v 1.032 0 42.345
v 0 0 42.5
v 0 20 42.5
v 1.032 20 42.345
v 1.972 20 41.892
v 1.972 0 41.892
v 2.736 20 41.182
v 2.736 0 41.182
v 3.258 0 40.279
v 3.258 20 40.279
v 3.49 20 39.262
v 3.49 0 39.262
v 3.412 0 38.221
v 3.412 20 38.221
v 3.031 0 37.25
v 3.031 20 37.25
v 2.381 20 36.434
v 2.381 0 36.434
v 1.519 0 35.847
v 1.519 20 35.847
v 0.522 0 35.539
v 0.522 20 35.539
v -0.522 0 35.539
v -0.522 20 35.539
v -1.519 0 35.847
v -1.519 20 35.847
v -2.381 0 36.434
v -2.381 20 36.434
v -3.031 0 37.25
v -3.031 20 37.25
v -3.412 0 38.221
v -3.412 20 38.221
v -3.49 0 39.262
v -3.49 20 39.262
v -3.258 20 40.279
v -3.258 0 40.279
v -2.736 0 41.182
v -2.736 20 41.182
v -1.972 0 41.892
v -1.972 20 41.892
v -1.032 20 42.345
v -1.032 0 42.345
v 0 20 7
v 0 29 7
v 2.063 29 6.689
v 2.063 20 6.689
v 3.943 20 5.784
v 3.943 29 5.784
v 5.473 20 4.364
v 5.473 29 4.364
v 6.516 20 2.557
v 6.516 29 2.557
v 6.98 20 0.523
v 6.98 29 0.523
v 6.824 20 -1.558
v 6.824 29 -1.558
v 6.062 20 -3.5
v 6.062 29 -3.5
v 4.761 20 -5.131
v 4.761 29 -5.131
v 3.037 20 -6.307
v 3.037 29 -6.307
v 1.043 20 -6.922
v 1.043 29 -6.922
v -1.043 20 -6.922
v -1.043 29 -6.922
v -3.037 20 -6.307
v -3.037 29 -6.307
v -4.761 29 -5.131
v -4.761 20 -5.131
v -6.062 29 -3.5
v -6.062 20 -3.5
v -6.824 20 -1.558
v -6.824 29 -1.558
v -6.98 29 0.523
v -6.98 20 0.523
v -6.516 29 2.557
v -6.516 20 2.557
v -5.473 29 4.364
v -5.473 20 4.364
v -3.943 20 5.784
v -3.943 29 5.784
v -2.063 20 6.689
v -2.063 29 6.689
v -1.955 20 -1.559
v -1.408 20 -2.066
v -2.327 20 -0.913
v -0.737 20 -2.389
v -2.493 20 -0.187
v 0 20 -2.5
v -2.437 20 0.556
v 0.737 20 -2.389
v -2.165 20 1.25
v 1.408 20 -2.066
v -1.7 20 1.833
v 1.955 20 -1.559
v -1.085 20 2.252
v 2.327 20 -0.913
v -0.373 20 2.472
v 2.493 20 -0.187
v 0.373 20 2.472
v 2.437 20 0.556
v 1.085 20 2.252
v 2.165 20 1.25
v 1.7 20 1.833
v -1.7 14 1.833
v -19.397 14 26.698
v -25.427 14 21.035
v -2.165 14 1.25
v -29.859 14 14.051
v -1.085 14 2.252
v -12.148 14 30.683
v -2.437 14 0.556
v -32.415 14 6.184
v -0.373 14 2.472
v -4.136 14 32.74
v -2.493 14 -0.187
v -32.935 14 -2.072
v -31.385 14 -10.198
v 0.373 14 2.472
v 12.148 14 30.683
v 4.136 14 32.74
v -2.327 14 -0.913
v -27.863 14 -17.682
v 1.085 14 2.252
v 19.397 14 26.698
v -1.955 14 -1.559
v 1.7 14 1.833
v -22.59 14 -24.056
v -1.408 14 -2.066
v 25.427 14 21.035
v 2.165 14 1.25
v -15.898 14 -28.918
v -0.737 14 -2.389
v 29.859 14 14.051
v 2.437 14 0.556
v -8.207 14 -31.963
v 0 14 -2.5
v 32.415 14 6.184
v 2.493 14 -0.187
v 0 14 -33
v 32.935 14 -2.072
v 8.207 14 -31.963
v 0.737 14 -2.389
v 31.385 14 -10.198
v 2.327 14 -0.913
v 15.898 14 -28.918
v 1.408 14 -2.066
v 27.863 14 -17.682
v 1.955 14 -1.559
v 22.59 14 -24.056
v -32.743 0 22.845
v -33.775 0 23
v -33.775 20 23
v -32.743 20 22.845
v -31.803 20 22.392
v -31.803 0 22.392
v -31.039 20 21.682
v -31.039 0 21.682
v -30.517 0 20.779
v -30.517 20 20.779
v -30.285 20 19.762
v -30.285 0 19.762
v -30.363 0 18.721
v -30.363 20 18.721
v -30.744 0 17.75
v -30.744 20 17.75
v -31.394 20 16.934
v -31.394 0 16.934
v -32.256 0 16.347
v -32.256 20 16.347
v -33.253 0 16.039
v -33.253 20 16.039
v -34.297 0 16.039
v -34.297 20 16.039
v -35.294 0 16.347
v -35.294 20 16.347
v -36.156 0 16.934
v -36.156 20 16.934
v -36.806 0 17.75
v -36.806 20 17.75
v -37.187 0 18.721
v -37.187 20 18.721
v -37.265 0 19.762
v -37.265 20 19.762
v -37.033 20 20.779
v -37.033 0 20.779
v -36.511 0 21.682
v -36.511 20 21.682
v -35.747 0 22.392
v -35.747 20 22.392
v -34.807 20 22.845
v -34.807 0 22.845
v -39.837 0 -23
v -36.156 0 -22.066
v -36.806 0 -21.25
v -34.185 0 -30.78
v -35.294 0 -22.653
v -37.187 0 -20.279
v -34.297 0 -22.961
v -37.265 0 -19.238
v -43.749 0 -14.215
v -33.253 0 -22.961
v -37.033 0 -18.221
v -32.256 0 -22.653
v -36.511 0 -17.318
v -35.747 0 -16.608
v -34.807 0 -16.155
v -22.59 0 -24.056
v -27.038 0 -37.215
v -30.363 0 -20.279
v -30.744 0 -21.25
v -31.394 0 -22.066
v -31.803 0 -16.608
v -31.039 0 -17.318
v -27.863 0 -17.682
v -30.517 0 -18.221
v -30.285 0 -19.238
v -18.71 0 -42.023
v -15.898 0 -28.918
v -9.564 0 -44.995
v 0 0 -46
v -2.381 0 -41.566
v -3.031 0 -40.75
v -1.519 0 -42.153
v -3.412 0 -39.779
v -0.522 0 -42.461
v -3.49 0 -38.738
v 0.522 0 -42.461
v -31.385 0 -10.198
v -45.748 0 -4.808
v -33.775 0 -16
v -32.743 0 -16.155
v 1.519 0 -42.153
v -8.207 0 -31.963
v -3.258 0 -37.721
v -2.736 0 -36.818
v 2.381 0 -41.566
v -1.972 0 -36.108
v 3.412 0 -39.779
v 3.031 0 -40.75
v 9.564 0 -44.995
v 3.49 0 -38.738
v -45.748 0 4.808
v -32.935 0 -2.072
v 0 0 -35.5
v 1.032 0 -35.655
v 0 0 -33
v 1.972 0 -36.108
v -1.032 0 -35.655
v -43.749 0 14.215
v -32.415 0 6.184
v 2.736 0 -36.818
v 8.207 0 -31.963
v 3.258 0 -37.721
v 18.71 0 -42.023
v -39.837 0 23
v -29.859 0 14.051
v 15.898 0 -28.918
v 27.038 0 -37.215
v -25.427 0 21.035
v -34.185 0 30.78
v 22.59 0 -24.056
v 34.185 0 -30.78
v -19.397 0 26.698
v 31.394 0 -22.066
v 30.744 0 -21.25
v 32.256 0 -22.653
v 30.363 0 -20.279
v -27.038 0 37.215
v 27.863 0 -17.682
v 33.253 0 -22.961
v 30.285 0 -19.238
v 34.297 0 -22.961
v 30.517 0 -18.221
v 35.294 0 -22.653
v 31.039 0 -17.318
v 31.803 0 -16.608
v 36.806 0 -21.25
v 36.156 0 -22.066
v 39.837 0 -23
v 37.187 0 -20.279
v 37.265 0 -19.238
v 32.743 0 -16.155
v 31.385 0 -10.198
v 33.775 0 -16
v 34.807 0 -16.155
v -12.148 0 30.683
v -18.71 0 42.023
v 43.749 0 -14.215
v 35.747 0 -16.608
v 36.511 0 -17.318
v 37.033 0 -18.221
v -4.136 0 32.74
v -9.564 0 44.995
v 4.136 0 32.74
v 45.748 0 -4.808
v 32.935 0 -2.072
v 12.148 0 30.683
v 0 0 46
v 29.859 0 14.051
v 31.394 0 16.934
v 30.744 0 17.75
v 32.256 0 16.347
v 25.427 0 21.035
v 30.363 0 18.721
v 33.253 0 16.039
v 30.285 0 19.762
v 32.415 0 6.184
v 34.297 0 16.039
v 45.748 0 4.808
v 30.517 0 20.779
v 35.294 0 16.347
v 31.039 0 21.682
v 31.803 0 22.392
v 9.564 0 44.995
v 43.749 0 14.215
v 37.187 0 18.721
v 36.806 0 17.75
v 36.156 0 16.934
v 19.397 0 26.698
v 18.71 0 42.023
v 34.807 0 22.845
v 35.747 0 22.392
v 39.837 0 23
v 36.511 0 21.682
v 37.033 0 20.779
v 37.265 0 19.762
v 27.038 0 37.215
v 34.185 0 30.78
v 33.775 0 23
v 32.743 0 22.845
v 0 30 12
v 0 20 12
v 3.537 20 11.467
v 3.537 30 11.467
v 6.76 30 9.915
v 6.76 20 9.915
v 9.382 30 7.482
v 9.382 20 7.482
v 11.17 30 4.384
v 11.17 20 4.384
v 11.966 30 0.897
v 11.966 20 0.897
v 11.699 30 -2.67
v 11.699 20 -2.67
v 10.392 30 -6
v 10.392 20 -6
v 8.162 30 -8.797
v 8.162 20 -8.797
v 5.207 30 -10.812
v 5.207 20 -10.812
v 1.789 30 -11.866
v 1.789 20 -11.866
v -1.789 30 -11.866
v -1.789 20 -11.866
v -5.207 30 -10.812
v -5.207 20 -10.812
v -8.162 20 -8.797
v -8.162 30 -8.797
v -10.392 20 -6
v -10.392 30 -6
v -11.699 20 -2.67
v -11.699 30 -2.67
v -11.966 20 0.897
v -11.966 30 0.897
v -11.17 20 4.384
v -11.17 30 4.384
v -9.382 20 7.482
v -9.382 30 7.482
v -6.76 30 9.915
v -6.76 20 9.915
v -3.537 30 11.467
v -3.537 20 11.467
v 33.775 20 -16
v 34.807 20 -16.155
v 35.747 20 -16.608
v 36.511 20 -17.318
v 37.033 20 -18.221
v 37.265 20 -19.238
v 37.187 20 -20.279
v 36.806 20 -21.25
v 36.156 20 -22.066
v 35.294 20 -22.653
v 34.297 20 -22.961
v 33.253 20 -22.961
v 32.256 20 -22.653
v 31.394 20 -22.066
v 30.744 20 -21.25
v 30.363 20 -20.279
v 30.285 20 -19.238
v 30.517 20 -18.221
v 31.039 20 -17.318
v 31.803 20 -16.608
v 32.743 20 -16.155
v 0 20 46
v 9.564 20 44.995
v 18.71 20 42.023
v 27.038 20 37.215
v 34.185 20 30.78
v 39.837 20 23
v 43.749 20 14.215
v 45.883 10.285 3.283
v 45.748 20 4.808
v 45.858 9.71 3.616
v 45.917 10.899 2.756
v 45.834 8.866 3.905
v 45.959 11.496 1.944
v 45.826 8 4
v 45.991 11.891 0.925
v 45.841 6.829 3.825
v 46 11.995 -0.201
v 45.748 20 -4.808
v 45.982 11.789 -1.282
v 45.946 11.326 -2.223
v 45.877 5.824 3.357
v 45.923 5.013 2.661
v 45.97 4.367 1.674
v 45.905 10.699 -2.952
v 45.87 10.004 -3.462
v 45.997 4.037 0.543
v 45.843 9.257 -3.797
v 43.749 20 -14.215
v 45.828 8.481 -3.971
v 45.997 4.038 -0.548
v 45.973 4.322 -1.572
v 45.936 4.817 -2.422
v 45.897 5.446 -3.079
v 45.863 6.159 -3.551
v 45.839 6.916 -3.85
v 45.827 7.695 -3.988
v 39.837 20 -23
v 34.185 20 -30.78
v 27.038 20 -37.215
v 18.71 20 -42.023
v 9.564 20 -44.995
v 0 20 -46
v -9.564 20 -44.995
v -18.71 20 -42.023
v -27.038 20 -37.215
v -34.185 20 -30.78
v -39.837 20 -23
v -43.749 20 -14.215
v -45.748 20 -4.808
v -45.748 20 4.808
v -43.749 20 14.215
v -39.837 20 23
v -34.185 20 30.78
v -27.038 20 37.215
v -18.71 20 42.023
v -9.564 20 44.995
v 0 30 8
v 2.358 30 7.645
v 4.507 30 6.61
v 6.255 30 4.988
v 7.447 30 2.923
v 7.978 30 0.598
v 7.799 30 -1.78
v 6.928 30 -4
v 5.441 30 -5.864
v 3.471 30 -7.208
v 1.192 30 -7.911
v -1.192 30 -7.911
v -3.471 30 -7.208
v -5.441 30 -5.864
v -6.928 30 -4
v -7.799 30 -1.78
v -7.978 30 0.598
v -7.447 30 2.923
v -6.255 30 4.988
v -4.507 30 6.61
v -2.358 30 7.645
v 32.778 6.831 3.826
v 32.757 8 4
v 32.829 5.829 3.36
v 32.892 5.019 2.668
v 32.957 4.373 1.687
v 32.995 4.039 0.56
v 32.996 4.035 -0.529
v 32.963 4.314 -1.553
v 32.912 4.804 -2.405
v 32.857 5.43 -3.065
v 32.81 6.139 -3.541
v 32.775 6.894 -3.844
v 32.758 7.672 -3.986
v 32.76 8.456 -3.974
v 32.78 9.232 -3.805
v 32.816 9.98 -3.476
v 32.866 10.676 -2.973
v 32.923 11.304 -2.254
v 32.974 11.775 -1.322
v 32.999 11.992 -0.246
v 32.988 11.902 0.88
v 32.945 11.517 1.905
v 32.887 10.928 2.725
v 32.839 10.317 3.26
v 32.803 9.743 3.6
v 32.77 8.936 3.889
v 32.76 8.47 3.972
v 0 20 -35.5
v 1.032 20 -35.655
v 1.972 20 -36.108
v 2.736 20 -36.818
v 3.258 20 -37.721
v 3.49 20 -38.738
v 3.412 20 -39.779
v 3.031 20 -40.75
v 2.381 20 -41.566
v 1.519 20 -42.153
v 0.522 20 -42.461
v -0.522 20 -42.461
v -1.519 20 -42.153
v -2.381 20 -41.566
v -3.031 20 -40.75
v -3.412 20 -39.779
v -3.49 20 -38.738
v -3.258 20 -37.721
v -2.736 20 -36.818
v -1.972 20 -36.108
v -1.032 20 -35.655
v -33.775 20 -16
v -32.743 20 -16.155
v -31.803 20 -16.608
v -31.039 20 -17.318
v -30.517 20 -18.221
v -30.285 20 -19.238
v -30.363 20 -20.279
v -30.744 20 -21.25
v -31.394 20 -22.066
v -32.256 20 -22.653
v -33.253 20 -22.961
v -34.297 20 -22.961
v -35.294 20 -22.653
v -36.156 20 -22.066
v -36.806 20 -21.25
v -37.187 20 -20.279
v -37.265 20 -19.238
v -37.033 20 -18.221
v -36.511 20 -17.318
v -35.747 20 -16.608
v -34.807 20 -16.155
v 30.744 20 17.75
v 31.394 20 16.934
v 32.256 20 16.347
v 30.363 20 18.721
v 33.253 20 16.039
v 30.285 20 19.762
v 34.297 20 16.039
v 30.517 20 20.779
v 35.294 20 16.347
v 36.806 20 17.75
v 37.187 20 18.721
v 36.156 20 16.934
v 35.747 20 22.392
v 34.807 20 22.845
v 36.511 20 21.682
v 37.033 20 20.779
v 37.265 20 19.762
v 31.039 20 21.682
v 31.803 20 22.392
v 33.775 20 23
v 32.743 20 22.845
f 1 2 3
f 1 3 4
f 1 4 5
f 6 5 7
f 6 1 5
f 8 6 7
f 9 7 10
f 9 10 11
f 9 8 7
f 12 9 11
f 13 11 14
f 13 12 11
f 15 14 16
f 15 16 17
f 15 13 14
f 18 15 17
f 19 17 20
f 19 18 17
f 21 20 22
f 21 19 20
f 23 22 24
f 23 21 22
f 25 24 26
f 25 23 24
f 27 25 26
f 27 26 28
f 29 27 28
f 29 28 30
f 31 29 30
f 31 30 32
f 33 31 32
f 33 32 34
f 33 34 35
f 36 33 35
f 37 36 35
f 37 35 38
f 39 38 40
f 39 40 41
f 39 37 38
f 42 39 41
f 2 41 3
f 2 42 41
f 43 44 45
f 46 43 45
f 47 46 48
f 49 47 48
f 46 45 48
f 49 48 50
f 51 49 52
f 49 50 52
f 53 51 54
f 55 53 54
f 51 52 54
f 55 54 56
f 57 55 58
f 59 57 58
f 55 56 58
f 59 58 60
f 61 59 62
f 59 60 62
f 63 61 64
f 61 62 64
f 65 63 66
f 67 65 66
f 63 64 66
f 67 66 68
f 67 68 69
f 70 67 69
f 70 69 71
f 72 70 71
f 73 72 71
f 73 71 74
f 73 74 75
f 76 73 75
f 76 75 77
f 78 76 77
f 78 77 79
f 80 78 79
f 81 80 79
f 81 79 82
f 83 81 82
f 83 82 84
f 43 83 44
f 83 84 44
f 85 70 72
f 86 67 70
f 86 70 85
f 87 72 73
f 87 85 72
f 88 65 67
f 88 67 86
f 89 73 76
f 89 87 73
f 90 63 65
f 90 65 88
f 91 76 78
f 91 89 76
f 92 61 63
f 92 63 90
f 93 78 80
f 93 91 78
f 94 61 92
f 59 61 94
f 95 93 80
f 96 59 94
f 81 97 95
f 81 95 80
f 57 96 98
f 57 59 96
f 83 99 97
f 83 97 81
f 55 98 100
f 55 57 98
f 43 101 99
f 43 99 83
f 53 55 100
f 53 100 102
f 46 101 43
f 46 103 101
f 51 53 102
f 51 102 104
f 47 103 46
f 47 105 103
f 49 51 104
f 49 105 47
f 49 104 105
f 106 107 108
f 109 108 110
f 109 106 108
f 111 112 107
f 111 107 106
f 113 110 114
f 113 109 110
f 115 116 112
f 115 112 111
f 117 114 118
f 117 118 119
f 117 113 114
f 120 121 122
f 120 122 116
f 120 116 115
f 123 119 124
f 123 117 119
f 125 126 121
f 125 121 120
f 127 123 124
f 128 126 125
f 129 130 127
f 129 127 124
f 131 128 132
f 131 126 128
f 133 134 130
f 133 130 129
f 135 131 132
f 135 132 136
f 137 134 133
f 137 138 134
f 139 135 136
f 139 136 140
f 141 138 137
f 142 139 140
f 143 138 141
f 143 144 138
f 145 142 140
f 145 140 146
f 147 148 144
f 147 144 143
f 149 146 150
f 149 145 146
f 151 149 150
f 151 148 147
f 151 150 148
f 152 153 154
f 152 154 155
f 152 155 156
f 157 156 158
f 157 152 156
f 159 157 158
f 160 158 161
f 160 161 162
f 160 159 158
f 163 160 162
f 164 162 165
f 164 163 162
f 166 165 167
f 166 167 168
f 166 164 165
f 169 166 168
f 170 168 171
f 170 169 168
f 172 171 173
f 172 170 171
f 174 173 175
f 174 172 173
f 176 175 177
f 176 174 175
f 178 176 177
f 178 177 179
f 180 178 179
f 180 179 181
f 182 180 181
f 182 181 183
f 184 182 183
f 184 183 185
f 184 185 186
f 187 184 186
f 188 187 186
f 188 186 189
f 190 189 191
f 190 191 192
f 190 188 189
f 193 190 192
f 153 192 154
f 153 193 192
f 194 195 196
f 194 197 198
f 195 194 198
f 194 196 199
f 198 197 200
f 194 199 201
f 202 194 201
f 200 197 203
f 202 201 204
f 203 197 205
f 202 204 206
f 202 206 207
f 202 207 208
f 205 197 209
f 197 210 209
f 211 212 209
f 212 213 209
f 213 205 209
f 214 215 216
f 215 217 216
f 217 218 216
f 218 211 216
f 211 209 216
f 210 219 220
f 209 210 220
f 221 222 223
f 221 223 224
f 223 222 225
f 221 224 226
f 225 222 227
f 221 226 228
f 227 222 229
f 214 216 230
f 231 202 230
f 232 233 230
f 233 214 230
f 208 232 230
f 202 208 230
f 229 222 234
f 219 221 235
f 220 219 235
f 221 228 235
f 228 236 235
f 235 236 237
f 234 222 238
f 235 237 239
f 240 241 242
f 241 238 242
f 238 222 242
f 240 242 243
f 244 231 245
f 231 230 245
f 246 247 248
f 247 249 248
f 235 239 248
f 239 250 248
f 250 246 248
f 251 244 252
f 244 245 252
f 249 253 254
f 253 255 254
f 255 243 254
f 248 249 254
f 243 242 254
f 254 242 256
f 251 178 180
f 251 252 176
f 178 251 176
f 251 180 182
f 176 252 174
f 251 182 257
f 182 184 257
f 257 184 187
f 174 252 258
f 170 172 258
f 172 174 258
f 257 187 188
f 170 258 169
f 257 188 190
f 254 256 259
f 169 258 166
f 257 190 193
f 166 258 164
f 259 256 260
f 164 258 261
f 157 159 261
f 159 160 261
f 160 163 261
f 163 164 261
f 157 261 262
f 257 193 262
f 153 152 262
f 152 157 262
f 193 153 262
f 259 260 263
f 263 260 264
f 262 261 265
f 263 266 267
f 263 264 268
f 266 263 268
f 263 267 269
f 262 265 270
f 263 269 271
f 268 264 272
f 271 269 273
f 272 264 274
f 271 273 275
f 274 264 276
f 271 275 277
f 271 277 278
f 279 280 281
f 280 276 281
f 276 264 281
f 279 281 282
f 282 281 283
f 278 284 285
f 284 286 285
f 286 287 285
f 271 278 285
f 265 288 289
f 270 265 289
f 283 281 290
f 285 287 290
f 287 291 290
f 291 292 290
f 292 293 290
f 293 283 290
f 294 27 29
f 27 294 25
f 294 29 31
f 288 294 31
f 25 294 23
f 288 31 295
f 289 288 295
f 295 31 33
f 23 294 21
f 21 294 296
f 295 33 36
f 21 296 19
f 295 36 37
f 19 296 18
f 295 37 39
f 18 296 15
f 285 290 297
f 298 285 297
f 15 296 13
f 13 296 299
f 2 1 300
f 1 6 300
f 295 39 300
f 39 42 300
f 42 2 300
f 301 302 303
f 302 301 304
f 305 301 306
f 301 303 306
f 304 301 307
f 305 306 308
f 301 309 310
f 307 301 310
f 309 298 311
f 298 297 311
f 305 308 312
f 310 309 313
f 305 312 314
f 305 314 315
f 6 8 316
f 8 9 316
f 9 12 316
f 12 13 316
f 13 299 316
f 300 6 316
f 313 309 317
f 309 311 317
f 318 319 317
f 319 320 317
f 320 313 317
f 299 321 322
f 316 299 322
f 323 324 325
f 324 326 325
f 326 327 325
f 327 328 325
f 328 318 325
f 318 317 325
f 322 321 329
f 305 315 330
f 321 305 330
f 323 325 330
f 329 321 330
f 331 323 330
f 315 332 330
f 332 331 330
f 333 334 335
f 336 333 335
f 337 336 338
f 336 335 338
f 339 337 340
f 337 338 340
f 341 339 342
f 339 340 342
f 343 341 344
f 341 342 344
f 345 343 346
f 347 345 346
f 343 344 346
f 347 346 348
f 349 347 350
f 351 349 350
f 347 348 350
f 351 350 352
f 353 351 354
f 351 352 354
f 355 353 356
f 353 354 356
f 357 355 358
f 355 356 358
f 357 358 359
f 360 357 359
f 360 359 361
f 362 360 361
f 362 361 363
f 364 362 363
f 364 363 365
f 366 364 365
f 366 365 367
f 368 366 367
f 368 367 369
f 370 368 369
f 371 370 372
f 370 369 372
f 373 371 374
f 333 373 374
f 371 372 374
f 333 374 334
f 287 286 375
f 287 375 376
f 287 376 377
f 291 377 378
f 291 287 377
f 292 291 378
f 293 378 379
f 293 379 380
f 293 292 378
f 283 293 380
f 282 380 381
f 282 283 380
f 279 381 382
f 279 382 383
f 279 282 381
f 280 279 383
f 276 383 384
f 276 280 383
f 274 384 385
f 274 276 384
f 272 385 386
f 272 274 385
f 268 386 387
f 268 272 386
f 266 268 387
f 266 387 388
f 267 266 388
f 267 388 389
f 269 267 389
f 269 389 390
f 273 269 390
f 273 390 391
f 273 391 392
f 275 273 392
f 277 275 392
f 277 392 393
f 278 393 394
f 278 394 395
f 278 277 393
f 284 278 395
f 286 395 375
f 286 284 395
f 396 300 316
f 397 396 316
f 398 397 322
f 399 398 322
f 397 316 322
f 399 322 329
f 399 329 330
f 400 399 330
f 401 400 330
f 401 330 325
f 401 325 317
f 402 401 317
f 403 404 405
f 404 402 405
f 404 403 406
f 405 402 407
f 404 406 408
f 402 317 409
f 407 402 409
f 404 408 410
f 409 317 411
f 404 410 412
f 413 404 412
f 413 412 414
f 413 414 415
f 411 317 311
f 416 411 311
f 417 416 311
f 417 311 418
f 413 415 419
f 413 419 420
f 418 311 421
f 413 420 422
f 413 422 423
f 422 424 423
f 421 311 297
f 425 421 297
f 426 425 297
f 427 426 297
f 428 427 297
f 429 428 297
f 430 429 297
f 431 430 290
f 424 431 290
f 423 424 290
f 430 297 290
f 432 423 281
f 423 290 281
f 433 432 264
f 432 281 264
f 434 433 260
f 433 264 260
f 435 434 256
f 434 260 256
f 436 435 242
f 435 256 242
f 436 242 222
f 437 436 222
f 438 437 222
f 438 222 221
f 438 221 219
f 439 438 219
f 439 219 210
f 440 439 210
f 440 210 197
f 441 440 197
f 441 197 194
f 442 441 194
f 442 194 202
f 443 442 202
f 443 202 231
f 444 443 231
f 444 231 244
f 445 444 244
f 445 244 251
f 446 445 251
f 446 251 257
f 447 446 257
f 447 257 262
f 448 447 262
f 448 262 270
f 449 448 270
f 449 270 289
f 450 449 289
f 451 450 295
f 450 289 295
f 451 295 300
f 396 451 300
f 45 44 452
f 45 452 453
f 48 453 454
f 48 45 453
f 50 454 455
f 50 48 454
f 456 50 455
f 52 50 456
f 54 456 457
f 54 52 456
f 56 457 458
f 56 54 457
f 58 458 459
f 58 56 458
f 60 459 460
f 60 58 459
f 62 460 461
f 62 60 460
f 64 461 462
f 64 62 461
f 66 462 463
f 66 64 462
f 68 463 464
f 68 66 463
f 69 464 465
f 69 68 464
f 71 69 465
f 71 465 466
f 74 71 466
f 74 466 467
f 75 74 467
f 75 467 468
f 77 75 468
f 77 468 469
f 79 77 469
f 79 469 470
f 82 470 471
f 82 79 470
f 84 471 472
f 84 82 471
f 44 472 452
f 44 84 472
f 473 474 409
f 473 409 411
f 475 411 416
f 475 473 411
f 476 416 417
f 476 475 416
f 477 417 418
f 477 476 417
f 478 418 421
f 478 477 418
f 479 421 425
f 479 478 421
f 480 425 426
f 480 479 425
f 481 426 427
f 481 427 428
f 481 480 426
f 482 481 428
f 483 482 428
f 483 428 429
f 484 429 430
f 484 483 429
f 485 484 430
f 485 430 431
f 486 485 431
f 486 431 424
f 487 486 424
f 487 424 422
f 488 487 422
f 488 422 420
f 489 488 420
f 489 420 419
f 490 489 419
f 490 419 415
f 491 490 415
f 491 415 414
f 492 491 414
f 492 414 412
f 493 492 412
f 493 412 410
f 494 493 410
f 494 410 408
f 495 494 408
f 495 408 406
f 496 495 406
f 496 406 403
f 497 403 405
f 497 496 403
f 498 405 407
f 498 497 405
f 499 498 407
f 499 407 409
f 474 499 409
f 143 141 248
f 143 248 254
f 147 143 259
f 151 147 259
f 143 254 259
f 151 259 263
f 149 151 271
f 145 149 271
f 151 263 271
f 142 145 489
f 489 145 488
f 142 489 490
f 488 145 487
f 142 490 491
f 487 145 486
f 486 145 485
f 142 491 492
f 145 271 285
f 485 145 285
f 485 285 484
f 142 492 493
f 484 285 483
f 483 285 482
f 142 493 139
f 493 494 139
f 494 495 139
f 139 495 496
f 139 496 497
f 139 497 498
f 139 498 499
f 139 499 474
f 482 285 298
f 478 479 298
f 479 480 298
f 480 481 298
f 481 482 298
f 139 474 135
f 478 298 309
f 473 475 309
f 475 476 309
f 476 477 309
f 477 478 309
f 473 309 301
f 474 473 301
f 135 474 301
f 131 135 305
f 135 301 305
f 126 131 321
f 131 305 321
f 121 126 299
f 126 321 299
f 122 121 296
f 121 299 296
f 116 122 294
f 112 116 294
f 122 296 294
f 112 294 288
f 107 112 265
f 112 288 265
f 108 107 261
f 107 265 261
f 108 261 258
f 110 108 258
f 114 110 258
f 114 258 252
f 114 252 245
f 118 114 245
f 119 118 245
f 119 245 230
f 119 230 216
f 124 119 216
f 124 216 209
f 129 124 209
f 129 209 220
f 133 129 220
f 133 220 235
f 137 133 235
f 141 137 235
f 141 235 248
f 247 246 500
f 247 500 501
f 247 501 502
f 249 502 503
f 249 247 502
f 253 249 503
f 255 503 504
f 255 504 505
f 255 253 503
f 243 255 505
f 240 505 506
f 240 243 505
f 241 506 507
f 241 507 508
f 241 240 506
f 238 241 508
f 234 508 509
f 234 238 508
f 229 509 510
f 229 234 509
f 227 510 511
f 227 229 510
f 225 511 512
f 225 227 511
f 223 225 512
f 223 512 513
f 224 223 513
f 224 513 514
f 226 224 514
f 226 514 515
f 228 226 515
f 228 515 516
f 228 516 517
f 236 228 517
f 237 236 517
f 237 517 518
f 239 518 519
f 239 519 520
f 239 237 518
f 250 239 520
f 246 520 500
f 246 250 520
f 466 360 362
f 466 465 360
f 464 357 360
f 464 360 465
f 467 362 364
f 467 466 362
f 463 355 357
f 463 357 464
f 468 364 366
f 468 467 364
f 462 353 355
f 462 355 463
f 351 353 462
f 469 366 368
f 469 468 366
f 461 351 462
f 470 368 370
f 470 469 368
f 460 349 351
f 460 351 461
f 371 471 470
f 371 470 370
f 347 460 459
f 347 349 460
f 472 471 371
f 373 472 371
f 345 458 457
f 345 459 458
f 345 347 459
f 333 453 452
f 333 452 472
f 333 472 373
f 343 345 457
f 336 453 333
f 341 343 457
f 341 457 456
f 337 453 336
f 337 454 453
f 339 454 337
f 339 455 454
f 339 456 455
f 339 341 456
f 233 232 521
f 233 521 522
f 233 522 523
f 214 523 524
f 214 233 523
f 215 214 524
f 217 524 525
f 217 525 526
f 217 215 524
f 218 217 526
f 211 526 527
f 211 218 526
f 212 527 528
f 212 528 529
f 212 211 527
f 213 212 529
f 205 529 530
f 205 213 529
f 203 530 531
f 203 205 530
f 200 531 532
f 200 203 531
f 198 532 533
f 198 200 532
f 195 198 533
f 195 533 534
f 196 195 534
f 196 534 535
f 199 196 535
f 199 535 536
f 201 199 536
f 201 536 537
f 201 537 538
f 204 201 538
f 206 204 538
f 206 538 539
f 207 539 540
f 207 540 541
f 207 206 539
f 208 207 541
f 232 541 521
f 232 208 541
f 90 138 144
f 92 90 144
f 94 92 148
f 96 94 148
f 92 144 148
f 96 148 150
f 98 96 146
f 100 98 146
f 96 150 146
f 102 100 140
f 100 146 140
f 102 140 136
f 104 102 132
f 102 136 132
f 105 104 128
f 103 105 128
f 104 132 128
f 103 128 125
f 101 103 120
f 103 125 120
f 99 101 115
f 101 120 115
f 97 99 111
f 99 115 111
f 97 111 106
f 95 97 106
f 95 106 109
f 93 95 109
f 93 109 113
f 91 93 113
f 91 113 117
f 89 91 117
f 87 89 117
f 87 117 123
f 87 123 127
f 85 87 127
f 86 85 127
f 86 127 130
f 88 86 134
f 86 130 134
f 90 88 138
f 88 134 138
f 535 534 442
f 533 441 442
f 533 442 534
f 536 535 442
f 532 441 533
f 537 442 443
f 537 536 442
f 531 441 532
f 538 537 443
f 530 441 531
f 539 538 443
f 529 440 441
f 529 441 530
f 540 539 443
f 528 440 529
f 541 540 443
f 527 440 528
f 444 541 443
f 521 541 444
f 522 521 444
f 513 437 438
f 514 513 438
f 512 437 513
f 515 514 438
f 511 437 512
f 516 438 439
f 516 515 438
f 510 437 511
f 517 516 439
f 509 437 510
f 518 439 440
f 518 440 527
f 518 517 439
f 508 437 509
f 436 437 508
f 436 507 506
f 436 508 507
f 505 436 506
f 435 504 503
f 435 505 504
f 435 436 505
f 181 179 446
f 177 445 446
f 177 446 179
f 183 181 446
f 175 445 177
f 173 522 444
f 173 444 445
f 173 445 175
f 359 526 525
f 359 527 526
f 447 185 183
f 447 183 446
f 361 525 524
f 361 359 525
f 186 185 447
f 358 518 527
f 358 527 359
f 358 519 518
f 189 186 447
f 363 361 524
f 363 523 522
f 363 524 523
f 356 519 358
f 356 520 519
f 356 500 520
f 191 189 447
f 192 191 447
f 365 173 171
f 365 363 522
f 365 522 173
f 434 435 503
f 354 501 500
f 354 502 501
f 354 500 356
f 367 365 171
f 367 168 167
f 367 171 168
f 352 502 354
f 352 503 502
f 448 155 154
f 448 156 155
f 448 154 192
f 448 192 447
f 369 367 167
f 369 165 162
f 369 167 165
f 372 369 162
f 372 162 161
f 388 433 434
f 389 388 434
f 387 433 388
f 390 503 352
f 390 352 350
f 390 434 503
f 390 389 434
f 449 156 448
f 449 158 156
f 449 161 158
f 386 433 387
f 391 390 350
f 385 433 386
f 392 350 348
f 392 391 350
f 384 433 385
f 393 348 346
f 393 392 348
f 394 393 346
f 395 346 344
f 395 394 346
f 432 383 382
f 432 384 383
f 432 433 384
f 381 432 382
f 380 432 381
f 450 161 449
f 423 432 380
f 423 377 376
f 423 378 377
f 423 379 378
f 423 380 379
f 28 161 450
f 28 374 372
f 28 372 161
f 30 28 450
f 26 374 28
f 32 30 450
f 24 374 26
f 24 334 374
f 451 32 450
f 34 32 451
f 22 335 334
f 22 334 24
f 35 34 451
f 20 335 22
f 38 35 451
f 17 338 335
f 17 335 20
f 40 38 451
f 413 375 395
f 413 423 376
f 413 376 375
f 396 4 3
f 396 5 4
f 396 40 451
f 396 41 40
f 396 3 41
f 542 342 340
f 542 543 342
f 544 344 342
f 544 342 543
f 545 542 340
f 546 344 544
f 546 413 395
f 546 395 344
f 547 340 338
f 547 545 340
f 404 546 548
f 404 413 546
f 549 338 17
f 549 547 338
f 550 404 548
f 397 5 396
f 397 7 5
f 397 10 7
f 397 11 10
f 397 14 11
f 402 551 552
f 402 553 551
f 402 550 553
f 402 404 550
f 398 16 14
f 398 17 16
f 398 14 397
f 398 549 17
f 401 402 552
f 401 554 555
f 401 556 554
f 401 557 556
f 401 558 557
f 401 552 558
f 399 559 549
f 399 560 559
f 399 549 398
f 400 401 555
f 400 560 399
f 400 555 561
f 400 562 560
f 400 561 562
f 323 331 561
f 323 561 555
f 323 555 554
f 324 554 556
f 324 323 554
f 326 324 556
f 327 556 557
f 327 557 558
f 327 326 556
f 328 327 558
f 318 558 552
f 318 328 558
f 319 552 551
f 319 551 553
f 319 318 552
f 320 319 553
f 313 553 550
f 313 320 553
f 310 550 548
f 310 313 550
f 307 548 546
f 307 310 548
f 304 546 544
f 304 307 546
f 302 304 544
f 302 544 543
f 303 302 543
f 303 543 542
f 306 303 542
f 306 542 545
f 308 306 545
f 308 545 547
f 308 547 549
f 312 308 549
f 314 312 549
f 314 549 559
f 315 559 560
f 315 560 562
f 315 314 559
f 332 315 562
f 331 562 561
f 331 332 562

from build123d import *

# Parameters (mm, degrees)
SKETCH1_R           = 46
SKETCH1_R_2         = 3.5
BOSS_EXTRUDE1_DEPTH = 20
SKETCH2_R           = 12
BOSS_EXTRUDE2_DEPTH = 10
SKETCH3_R           = 33
CUT_EXTRUDE1_DEPTH  = 14
SKETCH4_R           = 2.5
CUT_EXTRUDE2_DEPTH  = 6
SKETCH5_R           = 7
CUT_EXTRUDE3_DEPTH  = 10
CHAMFER2_SIZE       = 1
SKETCH6_R           = 4
CUT_EXTRUDE4_DEPTH  = 72.637978754


with BuildPart() as part:
    # Sketch1 → Boss-Extrude1 (new body)
    with BuildSketch(Plane(origin=(0, 0, 0), x_dir=(1, 0, 0), z_dir=(0, 1, 0))):
        with Locations(Location((0, 0, 0), (0, 0, 270))):
            Circle(SKETCH1_R)
        with Locations(Location((0, 39, 0), (0, 0, 270))):
            Circle(SKETCH1_R_2, mode=Mode.SUBTRACT)
        with Locations(Location((33.774990748, 19.5, 0), (0, 0, 270))):
            Circle(SKETCH1_R_2, mode=Mode.SUBTRACT)
        with Locations(Location((33.774990748, -19.5, 0), (0, 0, 270))):
            Circle(SKETCH1_R_2, mode=Mode.SUBTRACT)
        with Locations(Location((0, -39, 0), (0, 0, 270))):
            Circle(SKETCH1_R_2, mode=Mode.SUBTRACT)
        with Locations(Location((-33.774990748, -19.5, 0), (0, 0, 270))):
            Circle(SKETCH1_R_2, mode=Mode.SUBTRACT)
        with Locations(Location((-33.774990748, 19.5, 0), (0, 0, 270))):
            Circle(SKETCH1_R_2, mode=Mode.SUBTRACT)
    extrude(amount=BOSS_EXTRUDE1_DEPTH)

    # Sketch2 → Boss-Extrude2 (add)
    with BuildSketch(Plane(origin=(0, 20, 0), x_dir=(1, 0, 0), z_dir=(0, 1, 0))):
        with Locations(Location((0, 0, 0), (0, 0, 270))):
            Circle(SKETCH2_R)
    extrude(amount=BOSS_EXTRUDE2_DEPTH)

    # Sketch3 → Cut-Extrude1 (cut)
    with BuildSketch(Plane.XZ):
        with Locations(Location((0, 0, 0), (0, 0, 270))):
            Circle(SKETCH3_R)
    extrude(amount=-CUT_EXTRUDE1_DEPTH, mode=Mode.SUBTRACT)

    # Sketch4 → Cut-Extrude2 (cut)
    with BuildSketch(Plane.XZ.offset(-14)):
        with Locations(Location((0, 0, 0), (0, 0, 270))):
            Circle(SKETCH4_R)
    extrude(amount=-CUT_EXTRUDE2_DEPTH, mode=Mode.SUBTRACT)

    # Sketch5 → Cut-Extrude3 (cut)
    with BuildSketch(Plane(origin=(0, 30, 0), x_dir=(1, 0, 0), z_dir=(0, 1, 0))):
        with Locations(Location((0, 0, 0), (0, 0, 270))):
            Circle(SKETCH5_R)
    extrude(amount=-CUT_EXTRUDE3_DEPTH, mode=Mode.SUBTRACT)

    # Chamfer2
    chamfer2_edges = [part.edges().sort_by_distance(p)[0] for p in [
        (0, 30, -7),
    ]]
    chamfer(chamfer2_edges, length=CHAMFER2_SIZE)

    # Sketch6 → Cut-Extrude4 (cut, through all)
    with BuildSketch(Plane(origin=(0, 0, 0), x_dir=(0, 0, -1), z_dir=(1, 0, 0))):
        with Locations(Location((0, 8, 0), (0, 0, 180))):
            Circle(SKETCH6_R)
    extrude(amount=CUT_EXTRUDE4_DEPTH, mode=Mode.SUBTRACT)


solid = part.part
